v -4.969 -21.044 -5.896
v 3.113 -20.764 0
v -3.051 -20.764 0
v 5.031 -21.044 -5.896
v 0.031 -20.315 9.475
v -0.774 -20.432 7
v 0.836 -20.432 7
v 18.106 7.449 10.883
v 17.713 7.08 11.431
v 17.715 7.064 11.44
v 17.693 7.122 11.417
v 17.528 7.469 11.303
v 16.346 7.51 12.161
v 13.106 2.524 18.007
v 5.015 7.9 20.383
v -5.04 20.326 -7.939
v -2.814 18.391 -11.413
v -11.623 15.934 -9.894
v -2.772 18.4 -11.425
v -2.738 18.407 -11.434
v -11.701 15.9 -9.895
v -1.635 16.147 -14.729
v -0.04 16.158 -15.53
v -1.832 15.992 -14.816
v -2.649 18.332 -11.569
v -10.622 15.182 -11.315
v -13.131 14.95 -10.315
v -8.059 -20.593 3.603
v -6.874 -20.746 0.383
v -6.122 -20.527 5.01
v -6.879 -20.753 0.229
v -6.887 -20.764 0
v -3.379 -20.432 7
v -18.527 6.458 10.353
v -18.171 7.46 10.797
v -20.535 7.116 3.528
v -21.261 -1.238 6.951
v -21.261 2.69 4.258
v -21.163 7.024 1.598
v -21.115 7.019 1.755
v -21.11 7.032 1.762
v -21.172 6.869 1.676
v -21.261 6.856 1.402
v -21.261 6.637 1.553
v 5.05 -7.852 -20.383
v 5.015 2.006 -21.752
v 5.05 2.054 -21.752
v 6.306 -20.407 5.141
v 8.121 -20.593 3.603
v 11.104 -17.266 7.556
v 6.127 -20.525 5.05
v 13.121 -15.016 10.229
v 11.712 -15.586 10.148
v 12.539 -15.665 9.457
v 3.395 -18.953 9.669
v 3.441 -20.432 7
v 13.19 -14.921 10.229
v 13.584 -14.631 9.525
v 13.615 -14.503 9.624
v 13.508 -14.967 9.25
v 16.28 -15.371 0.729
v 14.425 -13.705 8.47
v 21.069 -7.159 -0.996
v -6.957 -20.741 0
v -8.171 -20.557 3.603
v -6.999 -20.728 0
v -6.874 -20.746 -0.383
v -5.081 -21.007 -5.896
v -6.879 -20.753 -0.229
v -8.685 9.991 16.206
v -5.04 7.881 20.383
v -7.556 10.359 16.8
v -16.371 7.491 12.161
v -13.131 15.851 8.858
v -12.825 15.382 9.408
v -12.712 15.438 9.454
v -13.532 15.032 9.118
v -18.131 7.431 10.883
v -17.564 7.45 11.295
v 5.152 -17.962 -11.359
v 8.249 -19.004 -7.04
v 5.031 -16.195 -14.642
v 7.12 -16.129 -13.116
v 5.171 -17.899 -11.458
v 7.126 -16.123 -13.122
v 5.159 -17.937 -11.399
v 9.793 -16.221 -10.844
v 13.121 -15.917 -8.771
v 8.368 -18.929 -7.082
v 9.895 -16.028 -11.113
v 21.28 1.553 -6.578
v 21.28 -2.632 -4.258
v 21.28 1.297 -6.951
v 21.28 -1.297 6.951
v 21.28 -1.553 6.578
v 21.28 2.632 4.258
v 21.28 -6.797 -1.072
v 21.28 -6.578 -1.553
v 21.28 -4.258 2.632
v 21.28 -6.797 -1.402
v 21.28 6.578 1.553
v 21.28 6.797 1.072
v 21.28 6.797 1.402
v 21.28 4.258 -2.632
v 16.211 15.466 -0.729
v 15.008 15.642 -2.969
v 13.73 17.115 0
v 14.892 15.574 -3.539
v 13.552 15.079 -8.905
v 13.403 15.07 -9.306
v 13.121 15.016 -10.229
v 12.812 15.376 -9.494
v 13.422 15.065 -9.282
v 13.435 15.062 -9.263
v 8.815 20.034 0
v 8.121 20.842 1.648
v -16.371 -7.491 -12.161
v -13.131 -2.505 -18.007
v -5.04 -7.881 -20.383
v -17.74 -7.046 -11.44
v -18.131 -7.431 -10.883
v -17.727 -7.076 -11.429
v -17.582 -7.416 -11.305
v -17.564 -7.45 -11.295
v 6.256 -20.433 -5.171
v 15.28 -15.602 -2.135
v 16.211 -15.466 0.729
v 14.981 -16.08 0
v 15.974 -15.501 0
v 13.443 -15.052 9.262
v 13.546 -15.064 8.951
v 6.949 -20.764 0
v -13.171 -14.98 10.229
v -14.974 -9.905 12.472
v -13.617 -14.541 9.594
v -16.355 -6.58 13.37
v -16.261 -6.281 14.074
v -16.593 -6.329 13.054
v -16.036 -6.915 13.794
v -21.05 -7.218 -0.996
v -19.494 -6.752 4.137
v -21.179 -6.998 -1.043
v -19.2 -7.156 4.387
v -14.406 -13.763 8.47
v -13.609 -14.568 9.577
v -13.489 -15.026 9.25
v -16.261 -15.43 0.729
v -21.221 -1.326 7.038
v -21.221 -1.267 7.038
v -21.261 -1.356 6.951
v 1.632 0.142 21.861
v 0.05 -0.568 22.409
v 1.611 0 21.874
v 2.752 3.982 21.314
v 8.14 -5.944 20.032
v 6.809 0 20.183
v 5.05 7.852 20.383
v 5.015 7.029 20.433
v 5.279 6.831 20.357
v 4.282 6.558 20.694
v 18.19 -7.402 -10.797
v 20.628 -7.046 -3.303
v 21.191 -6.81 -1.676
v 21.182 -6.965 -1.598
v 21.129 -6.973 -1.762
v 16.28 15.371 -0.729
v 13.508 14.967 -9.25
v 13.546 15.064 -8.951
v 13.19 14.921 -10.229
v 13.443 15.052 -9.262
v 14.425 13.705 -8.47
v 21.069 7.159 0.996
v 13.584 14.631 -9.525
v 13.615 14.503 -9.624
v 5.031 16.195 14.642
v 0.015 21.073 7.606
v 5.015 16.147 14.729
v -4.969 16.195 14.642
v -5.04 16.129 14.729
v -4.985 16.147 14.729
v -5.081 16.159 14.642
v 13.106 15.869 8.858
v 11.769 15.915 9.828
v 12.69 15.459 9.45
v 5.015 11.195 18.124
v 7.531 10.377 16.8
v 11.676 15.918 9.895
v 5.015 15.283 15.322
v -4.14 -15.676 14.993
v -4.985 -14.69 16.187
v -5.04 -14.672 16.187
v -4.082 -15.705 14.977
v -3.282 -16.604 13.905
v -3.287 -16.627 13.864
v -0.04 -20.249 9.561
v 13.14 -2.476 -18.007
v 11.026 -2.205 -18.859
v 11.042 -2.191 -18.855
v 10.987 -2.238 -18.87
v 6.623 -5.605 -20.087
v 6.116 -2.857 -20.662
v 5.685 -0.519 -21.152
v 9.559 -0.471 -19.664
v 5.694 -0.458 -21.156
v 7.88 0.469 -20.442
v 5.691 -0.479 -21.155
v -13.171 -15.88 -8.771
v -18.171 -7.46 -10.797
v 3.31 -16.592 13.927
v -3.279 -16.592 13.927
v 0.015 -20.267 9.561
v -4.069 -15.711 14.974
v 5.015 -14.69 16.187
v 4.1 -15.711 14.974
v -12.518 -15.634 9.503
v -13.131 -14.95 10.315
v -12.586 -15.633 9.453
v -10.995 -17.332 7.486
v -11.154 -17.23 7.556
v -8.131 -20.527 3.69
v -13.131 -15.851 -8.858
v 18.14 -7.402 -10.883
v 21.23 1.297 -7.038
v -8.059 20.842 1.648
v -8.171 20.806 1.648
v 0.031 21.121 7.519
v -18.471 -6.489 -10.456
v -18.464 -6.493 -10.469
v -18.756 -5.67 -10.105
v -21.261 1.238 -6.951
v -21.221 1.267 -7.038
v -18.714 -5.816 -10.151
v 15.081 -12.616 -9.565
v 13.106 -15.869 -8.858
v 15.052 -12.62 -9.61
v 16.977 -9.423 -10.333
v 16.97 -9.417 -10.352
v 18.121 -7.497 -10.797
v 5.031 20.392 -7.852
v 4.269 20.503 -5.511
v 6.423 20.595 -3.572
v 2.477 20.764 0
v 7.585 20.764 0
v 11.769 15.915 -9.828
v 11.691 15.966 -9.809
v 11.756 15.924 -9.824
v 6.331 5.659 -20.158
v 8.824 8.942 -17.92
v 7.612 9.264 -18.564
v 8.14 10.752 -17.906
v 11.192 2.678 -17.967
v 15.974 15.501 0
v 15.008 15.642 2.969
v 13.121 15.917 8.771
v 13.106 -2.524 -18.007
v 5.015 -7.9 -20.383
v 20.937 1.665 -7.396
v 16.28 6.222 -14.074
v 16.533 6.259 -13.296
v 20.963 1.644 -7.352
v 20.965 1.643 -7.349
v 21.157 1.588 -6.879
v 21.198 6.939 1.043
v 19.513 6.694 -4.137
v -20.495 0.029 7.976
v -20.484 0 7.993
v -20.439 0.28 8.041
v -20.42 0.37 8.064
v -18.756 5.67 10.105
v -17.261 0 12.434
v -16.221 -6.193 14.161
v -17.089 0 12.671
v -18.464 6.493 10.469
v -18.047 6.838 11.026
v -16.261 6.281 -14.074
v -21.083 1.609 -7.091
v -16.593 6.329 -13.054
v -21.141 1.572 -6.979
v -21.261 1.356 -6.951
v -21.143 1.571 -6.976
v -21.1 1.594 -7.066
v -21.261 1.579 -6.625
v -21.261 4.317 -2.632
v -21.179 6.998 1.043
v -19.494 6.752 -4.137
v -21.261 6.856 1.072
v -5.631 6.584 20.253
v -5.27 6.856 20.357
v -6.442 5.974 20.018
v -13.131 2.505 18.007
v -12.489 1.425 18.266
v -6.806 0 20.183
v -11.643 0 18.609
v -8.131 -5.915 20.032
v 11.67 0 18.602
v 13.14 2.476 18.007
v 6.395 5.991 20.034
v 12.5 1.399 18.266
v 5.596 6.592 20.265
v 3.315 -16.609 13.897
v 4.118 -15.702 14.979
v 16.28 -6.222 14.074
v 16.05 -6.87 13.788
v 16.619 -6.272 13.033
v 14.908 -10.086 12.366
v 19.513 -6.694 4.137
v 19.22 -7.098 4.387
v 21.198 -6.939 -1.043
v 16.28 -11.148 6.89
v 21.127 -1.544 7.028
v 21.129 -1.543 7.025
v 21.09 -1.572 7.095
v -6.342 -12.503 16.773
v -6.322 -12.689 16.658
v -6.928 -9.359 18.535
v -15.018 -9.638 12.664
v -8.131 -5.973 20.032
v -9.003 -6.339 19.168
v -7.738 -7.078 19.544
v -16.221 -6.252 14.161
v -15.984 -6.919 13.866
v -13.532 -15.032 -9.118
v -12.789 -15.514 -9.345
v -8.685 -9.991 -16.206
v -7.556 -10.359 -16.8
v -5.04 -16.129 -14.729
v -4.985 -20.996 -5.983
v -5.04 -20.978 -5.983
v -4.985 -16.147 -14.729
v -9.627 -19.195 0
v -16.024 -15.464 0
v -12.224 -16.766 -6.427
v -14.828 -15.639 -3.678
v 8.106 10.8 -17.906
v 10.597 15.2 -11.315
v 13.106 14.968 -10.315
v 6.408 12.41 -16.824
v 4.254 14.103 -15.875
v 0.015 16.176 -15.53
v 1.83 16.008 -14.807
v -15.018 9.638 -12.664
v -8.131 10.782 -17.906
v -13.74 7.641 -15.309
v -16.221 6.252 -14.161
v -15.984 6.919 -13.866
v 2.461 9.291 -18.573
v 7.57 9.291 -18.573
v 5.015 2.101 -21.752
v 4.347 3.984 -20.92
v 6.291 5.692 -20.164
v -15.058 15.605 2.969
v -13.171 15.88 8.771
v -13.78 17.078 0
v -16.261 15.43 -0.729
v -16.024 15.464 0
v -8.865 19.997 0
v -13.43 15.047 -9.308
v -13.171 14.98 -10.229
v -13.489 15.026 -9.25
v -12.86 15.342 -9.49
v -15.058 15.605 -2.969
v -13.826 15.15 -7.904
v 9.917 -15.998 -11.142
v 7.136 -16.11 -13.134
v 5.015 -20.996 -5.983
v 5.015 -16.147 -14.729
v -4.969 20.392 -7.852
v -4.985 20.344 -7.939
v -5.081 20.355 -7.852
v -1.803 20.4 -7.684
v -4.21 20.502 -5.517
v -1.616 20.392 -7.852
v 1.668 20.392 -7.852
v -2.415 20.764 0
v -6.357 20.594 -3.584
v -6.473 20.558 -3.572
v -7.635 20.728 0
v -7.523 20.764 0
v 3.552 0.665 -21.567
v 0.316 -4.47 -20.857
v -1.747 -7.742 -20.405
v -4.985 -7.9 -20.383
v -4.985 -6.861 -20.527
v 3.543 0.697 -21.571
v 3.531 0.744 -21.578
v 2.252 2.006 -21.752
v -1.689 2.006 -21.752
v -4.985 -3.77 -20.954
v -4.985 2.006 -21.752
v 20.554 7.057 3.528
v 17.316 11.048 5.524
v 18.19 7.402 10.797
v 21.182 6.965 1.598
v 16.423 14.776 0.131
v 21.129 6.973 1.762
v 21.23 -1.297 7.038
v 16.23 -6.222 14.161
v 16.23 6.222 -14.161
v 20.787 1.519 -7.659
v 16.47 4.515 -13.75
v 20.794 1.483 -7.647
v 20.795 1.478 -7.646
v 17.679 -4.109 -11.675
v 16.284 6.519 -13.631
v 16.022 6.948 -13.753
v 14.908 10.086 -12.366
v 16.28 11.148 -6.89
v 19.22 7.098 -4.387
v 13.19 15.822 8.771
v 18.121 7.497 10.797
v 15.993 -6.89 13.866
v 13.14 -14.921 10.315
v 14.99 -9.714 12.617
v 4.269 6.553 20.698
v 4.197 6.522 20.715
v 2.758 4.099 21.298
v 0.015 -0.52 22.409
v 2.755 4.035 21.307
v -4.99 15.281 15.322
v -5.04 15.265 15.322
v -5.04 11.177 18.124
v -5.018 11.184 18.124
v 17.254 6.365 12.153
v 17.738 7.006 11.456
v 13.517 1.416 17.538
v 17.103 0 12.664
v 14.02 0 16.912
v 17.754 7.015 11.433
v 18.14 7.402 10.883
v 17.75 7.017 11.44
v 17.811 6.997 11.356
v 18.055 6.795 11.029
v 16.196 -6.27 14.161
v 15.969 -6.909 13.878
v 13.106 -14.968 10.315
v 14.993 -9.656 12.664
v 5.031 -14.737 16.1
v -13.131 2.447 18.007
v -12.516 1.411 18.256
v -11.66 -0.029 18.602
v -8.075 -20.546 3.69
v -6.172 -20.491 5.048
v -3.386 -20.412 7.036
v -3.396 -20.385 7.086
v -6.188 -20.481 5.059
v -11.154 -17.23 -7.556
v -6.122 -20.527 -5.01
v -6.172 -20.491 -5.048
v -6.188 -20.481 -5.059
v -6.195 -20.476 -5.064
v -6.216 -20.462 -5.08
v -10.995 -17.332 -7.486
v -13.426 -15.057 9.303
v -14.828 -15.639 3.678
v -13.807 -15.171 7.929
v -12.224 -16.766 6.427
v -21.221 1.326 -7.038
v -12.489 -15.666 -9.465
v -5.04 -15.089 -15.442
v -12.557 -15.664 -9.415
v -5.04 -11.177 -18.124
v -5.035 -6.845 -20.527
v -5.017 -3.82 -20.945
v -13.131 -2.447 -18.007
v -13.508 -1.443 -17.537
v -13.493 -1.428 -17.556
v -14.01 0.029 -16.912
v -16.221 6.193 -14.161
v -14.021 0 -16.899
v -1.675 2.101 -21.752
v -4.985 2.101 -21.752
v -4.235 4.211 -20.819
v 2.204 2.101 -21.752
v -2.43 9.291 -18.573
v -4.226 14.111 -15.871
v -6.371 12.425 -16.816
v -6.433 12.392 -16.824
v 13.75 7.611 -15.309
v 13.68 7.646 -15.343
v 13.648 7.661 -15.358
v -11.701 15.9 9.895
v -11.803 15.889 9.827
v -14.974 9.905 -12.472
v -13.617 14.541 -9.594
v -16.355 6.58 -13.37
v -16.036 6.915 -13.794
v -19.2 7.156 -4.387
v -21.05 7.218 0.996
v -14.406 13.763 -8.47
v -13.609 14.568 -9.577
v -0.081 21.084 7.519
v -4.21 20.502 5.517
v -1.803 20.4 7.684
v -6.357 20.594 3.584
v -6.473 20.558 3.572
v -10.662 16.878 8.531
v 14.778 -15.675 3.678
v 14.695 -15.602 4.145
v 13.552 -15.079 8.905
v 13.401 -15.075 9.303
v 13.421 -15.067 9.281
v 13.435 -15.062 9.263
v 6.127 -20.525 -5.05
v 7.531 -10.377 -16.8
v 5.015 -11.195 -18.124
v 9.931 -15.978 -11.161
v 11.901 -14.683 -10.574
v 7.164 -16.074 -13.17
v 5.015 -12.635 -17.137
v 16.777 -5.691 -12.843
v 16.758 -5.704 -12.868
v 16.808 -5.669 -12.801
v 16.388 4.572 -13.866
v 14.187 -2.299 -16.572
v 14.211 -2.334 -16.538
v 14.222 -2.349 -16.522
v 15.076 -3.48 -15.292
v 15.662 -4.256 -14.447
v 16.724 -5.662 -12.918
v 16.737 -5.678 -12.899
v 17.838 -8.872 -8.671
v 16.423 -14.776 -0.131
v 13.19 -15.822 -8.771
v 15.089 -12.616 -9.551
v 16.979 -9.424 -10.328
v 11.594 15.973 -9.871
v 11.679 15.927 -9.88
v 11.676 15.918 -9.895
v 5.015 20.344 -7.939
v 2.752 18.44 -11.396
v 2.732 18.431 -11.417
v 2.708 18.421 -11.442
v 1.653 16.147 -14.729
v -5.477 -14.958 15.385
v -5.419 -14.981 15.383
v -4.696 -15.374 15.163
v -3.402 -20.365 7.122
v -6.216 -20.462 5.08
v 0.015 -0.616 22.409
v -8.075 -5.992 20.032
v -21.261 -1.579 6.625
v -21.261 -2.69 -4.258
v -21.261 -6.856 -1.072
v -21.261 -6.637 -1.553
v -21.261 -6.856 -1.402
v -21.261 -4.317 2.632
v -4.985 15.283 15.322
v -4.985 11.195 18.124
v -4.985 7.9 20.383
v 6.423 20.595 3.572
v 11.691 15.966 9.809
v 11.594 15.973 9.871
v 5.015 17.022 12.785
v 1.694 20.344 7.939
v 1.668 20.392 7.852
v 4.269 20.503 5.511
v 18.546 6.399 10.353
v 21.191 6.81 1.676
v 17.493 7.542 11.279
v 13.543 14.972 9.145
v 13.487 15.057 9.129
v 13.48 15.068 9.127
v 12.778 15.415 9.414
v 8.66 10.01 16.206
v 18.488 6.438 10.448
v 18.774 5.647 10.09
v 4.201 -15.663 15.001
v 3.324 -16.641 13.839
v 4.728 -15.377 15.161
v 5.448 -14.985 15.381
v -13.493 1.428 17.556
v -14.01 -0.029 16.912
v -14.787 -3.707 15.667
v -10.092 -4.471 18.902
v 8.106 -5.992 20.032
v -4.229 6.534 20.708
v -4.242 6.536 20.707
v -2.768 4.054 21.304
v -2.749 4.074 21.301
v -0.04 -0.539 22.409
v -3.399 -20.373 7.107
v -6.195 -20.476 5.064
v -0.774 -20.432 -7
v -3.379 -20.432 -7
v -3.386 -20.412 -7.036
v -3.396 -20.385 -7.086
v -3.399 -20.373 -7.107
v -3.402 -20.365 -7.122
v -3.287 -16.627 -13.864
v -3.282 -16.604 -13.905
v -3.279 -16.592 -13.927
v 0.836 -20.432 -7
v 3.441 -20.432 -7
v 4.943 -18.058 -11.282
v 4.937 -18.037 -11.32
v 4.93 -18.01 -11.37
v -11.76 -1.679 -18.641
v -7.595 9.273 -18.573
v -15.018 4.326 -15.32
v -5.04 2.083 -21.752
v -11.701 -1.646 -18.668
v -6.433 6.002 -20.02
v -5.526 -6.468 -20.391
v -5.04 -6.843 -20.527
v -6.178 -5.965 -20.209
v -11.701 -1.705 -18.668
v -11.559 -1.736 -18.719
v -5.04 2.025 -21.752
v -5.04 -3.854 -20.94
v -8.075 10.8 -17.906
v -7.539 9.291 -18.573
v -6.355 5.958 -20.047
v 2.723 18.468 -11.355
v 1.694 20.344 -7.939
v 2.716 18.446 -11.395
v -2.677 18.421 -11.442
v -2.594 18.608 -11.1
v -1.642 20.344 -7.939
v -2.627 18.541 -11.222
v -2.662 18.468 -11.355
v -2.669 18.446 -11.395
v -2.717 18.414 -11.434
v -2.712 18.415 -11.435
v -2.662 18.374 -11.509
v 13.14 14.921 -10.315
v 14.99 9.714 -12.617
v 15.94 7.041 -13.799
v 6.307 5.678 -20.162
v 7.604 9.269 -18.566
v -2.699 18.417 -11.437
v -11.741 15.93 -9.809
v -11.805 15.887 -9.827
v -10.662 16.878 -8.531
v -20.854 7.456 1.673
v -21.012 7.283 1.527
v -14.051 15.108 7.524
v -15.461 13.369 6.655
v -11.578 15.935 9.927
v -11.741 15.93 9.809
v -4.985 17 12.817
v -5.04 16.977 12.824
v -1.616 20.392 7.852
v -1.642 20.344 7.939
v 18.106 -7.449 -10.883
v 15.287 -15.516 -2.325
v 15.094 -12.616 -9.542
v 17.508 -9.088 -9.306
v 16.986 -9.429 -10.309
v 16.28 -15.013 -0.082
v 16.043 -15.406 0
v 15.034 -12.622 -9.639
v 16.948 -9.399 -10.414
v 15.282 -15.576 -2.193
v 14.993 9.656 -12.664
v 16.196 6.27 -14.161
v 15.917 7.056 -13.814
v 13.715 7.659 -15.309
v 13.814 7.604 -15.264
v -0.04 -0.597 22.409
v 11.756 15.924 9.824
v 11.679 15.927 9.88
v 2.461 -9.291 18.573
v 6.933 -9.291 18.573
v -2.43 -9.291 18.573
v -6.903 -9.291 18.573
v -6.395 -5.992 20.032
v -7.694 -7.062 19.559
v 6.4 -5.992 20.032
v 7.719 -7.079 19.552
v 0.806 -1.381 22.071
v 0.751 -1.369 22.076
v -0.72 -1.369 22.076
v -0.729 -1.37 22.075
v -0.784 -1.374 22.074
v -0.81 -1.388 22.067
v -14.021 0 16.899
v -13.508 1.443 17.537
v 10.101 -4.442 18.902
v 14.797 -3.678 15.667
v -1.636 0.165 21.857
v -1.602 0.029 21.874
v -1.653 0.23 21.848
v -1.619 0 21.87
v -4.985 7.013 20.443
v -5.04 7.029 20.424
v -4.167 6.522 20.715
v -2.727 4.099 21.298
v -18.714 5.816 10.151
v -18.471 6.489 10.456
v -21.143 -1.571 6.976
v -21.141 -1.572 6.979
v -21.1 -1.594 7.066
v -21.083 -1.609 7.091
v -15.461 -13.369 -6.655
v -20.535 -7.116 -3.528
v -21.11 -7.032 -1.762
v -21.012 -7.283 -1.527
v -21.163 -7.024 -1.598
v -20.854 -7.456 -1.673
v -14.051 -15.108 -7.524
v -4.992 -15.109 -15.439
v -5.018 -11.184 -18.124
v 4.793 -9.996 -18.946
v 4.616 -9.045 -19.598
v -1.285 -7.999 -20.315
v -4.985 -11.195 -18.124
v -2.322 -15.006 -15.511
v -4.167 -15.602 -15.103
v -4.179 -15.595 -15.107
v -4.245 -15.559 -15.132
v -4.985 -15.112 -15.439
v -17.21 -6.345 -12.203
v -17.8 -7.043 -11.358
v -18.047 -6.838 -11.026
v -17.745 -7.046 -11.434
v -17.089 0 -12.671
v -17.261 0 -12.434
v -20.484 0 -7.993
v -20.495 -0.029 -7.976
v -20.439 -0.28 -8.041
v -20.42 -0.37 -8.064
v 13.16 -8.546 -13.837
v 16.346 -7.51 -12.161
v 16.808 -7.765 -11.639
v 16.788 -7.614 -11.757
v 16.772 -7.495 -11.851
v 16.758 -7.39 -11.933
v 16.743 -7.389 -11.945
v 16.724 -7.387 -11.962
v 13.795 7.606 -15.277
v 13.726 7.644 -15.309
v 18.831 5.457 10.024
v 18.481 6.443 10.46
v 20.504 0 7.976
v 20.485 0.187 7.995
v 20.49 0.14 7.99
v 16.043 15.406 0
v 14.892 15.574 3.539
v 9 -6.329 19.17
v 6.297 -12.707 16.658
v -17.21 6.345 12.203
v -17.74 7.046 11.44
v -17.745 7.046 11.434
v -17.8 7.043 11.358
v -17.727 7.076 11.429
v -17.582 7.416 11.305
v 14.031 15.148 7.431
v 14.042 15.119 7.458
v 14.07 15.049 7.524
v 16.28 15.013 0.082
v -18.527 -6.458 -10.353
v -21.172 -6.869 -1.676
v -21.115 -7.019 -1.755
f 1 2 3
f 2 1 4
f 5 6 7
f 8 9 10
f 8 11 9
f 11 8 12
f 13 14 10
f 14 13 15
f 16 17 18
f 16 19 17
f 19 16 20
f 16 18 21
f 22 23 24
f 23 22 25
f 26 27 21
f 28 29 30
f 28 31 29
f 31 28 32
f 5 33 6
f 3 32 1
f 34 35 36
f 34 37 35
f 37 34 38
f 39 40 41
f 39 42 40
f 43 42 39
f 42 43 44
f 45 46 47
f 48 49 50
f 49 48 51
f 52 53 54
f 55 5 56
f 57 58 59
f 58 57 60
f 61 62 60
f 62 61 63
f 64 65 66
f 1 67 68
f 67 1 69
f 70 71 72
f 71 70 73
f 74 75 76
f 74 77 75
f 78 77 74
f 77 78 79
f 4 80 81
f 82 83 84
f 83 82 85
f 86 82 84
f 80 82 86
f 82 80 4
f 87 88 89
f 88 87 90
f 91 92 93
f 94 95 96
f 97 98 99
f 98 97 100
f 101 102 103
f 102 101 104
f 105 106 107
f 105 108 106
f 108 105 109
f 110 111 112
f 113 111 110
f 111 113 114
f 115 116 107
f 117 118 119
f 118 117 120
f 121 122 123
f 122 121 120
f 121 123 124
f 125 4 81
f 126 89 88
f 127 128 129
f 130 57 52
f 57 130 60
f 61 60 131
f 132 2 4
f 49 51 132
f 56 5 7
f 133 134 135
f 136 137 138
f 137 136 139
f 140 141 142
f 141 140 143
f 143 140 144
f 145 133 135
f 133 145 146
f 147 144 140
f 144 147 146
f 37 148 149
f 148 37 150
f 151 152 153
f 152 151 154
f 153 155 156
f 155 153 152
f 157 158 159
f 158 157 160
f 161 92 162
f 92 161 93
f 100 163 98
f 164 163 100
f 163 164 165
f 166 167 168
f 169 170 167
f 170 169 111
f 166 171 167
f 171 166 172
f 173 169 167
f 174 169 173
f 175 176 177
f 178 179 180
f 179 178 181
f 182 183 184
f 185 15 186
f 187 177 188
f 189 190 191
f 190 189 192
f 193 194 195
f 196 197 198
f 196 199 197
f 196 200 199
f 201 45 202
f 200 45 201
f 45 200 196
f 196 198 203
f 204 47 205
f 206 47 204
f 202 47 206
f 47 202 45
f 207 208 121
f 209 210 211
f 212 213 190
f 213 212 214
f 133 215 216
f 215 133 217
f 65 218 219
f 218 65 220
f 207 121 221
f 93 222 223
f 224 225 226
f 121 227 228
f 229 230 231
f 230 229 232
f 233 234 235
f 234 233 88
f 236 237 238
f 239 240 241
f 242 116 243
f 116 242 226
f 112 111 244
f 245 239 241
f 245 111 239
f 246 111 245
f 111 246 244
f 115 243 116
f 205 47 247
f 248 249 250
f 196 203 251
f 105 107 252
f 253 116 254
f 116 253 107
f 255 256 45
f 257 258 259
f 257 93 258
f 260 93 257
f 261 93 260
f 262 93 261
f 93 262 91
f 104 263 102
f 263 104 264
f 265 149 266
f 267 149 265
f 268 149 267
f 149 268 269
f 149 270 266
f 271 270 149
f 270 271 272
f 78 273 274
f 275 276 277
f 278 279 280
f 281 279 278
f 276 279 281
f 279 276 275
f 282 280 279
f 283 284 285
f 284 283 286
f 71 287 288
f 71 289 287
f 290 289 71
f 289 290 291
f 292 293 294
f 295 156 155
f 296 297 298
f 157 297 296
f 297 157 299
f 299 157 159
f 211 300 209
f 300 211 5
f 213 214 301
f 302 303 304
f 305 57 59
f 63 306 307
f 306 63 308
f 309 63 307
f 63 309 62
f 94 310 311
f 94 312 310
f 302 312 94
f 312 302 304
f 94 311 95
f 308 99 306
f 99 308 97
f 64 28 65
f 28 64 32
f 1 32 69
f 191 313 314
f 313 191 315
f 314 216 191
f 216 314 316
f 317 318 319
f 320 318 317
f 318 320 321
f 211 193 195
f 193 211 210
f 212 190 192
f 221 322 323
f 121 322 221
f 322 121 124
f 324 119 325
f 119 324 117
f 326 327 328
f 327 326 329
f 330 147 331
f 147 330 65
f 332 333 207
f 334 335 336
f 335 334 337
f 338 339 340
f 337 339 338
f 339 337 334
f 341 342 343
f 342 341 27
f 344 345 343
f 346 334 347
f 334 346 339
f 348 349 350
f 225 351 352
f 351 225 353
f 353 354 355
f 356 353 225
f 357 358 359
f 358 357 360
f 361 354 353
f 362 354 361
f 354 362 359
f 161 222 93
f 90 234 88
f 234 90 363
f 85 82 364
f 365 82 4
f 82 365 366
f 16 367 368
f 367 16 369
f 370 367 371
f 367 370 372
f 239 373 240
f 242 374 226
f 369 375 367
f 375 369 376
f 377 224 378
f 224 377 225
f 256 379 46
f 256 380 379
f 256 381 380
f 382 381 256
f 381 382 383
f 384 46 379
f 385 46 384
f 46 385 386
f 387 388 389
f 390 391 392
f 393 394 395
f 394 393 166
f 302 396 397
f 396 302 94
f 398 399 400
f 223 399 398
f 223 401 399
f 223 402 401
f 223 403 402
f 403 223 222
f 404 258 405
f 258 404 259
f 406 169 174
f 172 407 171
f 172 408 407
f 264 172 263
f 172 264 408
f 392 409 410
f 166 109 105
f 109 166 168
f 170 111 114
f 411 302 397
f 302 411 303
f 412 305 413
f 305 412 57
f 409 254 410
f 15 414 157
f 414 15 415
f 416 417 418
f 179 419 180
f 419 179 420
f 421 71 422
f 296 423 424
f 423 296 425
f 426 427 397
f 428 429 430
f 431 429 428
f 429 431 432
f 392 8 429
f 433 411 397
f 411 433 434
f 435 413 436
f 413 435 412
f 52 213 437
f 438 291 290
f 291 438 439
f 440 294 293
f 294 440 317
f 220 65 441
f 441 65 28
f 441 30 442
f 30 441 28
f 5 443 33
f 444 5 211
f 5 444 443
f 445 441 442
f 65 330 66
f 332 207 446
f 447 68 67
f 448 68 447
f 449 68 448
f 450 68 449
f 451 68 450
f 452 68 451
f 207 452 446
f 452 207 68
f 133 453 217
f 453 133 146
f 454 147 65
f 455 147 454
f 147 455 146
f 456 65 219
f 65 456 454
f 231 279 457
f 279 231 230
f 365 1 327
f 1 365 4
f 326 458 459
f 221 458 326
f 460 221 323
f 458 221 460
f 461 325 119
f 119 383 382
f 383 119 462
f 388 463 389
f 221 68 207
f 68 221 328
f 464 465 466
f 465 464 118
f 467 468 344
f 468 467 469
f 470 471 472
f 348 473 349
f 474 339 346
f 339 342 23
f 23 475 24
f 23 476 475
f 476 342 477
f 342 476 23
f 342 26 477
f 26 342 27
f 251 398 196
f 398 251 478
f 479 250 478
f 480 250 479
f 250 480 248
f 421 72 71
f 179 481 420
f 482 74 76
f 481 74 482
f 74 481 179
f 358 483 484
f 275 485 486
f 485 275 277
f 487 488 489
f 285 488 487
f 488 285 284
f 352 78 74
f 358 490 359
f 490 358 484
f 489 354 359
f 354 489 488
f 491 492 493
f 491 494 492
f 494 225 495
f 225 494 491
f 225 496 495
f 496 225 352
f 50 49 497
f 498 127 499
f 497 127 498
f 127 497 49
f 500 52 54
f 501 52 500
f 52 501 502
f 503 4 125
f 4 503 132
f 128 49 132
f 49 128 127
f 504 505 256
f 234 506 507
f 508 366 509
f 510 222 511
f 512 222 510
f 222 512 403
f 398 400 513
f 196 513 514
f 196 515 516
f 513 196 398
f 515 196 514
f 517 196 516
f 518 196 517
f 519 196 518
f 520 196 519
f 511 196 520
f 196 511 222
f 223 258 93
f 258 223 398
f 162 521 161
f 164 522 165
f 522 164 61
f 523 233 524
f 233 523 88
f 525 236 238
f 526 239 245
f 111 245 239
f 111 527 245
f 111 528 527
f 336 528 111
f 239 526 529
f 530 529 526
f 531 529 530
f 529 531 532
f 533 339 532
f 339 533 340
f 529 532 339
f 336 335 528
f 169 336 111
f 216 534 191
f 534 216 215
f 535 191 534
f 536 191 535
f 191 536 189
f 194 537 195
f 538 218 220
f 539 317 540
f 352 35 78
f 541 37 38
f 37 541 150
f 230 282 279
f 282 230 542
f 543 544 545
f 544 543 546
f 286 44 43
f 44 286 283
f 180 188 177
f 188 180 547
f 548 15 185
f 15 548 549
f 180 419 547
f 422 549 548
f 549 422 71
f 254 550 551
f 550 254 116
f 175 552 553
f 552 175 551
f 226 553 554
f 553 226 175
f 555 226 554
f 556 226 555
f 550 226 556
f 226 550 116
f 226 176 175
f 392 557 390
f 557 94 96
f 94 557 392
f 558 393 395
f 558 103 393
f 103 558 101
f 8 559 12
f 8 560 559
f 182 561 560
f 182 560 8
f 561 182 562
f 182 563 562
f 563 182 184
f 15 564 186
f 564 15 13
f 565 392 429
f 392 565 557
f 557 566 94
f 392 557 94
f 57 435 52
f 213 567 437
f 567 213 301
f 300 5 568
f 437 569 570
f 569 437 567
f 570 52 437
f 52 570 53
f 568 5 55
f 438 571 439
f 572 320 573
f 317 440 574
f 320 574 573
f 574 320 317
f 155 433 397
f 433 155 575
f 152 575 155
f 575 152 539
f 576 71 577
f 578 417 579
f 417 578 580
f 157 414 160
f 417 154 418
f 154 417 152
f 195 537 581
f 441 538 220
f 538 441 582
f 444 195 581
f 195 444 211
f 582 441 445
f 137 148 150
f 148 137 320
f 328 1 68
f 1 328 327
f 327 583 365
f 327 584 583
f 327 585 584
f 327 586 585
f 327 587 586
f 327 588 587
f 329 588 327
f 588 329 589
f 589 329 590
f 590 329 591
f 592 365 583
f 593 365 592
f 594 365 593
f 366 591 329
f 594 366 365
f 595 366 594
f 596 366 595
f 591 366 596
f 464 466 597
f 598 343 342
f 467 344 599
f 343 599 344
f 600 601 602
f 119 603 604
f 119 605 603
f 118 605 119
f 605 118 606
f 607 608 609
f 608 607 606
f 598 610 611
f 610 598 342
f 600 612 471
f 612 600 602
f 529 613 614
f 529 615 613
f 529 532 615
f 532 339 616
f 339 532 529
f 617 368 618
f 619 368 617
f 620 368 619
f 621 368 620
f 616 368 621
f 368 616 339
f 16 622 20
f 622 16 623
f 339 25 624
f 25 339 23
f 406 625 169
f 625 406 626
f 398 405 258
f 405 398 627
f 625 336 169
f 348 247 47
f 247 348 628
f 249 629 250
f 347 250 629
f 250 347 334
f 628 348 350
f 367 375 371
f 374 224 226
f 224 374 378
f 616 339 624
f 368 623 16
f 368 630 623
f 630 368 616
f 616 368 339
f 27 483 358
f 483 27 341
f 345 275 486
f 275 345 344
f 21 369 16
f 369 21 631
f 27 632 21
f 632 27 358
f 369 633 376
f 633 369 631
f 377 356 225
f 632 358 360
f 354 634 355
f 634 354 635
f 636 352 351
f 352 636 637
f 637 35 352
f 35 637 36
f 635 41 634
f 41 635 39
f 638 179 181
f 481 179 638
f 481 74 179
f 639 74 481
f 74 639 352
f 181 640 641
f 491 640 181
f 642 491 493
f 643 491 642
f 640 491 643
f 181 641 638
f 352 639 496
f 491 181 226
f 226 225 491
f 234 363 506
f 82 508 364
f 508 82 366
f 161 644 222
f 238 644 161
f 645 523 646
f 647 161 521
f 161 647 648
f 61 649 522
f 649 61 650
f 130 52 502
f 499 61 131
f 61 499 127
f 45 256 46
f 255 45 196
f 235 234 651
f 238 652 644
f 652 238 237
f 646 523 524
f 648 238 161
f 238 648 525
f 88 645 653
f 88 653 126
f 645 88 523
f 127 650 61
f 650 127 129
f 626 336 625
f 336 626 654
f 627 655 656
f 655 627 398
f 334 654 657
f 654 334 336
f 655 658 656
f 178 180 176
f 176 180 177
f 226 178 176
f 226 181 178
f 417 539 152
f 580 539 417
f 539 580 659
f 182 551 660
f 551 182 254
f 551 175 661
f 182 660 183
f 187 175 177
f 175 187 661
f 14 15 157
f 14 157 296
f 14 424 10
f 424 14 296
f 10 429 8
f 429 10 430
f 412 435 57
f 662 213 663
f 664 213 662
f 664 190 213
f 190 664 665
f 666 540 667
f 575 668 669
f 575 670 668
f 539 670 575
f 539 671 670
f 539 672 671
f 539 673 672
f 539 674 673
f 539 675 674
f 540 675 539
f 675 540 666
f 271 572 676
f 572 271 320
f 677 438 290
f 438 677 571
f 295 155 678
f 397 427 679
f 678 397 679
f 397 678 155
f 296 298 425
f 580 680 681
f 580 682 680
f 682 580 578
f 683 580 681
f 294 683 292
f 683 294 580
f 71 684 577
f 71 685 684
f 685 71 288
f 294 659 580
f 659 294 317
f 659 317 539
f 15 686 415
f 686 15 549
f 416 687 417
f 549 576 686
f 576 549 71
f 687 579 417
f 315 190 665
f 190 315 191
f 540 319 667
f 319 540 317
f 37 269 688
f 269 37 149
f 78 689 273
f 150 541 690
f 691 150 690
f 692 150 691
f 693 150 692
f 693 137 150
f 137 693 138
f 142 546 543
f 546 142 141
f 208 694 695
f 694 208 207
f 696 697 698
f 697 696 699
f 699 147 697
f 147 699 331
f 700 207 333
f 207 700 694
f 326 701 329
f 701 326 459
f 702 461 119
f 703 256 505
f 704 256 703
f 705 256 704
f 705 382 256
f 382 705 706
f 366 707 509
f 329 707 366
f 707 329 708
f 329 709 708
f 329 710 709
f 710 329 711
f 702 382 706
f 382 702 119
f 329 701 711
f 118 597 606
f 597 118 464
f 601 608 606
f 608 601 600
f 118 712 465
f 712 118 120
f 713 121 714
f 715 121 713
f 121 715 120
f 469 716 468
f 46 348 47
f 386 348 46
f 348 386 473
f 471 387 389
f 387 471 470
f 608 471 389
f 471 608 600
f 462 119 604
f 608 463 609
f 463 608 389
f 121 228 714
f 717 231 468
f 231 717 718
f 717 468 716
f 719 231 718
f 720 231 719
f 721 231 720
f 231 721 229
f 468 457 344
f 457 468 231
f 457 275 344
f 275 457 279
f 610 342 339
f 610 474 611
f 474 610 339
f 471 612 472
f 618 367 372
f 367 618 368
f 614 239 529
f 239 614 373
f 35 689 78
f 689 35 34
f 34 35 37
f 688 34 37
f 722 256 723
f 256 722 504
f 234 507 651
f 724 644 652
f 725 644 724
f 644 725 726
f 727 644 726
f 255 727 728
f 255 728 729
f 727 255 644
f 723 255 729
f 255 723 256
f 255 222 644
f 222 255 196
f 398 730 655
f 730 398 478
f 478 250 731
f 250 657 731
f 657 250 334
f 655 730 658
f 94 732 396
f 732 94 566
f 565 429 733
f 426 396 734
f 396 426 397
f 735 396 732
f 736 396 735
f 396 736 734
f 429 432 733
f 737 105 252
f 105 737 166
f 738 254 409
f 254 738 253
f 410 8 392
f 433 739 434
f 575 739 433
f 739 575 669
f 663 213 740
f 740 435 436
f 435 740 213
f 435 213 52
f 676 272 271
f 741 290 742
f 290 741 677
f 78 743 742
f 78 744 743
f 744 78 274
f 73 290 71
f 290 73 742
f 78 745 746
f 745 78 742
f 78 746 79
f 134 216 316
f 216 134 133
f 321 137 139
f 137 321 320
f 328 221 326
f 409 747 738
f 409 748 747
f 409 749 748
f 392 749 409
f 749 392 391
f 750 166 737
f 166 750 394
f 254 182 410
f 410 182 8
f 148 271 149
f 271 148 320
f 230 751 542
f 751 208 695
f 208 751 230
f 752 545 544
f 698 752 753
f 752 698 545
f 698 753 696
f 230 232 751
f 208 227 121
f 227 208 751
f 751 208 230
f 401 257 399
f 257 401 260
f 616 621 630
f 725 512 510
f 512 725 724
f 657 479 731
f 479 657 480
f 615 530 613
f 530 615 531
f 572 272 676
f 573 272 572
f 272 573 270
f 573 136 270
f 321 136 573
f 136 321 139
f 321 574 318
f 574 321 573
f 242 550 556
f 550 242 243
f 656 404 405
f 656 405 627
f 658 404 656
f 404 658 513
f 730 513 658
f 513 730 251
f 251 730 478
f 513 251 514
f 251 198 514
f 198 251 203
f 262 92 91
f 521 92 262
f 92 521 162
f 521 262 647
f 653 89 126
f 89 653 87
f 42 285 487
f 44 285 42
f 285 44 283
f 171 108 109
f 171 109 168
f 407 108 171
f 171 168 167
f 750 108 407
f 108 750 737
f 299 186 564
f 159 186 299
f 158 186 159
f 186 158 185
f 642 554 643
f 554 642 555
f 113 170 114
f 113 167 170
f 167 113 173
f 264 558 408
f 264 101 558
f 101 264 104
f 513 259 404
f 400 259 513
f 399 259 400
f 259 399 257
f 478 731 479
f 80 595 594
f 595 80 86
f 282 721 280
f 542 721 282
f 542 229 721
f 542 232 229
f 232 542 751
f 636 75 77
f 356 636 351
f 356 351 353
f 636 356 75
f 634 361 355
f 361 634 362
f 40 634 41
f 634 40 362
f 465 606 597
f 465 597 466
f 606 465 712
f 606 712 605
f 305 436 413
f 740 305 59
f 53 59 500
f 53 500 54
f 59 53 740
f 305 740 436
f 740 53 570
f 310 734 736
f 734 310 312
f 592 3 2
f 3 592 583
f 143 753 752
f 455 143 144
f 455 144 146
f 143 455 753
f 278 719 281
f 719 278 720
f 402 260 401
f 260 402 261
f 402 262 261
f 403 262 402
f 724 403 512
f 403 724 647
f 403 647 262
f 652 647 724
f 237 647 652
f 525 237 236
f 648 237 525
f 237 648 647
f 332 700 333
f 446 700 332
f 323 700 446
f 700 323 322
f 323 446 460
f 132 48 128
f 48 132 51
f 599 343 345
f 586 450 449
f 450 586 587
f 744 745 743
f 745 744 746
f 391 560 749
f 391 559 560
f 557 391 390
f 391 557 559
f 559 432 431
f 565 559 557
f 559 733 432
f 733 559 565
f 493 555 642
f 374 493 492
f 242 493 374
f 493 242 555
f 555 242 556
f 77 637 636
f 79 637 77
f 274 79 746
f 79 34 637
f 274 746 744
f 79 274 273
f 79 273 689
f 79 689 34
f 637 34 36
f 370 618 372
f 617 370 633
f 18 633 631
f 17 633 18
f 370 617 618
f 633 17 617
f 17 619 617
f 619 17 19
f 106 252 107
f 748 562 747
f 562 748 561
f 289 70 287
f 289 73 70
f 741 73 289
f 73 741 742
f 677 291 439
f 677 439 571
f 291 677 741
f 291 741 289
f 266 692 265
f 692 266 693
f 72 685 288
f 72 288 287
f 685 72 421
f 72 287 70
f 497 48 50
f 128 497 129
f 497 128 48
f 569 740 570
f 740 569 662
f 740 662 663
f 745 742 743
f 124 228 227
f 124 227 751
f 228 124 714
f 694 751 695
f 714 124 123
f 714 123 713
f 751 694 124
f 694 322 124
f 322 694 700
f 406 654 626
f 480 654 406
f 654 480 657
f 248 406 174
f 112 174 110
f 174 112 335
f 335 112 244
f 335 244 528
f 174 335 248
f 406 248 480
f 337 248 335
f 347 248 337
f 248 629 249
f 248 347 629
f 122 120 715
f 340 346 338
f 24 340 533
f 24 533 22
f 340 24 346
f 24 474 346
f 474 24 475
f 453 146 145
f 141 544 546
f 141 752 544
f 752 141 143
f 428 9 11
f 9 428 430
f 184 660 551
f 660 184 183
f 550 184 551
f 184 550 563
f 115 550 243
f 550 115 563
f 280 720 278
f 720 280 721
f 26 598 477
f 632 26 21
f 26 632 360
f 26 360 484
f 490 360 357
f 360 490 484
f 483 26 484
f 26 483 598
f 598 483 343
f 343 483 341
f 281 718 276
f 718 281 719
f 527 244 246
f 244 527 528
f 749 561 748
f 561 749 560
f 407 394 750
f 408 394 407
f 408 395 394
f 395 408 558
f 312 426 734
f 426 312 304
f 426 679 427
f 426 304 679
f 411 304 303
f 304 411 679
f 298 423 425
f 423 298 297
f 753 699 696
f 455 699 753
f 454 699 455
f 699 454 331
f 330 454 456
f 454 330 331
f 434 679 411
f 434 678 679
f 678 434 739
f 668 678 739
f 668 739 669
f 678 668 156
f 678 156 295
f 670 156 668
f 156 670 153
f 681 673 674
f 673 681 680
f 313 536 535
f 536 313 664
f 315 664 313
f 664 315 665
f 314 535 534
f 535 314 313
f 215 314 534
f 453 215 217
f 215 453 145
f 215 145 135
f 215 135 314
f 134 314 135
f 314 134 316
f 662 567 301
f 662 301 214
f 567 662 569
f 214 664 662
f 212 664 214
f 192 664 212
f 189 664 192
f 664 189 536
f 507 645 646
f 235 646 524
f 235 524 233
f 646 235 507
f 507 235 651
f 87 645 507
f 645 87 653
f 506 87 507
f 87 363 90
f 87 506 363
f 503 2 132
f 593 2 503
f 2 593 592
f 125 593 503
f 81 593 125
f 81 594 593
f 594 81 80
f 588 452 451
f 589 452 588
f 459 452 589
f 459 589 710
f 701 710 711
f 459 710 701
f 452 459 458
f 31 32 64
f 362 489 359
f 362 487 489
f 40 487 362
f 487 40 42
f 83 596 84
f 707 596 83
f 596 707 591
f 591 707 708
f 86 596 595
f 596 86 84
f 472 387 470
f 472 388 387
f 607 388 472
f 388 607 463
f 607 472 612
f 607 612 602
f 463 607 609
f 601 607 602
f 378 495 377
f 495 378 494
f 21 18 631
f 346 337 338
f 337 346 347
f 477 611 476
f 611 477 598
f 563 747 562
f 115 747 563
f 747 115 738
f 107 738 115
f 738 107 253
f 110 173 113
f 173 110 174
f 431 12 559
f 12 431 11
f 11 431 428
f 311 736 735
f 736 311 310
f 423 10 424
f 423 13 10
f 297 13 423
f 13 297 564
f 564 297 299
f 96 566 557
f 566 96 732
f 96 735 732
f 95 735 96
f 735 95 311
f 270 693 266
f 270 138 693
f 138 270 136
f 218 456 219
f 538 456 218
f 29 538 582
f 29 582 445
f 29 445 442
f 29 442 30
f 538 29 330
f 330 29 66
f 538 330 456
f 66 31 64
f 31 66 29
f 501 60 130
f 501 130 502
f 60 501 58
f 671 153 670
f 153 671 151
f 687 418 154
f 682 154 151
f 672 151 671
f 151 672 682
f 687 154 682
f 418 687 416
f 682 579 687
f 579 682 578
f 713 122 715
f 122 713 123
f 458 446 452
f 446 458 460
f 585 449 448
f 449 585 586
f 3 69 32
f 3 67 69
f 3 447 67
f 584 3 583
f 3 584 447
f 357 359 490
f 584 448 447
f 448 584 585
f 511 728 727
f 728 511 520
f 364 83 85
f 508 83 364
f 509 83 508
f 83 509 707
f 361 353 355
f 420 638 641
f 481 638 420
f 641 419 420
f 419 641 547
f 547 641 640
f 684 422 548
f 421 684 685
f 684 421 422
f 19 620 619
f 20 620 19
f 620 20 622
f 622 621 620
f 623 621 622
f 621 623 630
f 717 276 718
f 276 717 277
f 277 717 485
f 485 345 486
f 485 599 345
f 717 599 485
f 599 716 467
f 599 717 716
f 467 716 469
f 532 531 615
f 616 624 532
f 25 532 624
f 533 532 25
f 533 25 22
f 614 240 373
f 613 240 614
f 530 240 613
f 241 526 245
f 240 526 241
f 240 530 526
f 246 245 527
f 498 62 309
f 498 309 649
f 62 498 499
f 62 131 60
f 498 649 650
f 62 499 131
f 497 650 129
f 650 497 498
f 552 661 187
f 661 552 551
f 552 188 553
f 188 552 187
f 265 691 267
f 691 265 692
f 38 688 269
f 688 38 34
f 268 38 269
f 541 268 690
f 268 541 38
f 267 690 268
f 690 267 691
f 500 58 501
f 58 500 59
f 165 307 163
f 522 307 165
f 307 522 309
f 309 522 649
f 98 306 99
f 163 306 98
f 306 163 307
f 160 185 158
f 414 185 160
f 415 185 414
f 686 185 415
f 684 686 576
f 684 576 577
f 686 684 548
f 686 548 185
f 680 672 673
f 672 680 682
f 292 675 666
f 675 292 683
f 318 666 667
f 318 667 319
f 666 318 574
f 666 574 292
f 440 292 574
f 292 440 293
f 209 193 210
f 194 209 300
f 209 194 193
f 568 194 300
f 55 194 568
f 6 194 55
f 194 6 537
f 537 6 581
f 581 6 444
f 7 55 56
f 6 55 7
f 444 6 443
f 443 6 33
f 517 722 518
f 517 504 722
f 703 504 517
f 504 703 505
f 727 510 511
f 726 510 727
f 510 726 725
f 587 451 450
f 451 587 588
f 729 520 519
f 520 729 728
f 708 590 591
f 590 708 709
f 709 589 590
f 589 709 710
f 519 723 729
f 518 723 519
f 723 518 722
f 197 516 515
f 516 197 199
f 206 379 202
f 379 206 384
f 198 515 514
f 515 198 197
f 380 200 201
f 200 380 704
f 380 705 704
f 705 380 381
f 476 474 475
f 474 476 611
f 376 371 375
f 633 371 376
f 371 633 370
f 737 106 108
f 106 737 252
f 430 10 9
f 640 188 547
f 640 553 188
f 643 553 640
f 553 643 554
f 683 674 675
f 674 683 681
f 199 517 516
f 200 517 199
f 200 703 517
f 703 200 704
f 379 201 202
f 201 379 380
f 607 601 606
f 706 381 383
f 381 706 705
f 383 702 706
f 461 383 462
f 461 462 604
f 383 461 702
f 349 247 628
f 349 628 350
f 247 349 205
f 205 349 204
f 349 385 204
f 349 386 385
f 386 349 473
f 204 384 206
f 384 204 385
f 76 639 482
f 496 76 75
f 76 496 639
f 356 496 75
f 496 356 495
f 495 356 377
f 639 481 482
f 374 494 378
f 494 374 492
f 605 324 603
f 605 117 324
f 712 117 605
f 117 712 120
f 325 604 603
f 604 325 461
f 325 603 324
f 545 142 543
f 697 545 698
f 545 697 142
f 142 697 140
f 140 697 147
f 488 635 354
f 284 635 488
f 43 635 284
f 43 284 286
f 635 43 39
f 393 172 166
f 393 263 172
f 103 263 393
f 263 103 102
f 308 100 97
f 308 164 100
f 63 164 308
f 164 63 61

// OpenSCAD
// Auto-generated OpenSCAD file

    inner_points = 10*[[0.5000000000001233, 1.6099947582269307, -1.4642352461204697], [-1.6180339887500594, -0.7526043623065494, 1.3422446358941107], [0.8090169943752056, 0.7804419520270026, -1.929370322107236], [-1.3090169943749772, -1.5821571685064775, 0.8771095599073444], [1.3090169943749772, 1.5821571685064775, -0.8771095599073444], [-0.8090169943752056, -0.7804419520270026, 1.929370322107236], [1.6180339887500594, 0.7526043623065494, -1.3422446358941107], [-0.5000000000001233, -1.6099947582269307, 1.4642352461204697], [-1.6180339887497301, 0.752604362306319, -1.342244635894637], [-2.118033988749798, 0.1948703662791984, -0.6797246062536065], [-1.309016994374648, -0.07694844389360919, -1.8073797118814032], [-1.8090169943747159, -0.6346824399207297, -1.144859682240373], [1.8090169943747159, 0.6346824399207297, 1.144859682240373], [1.309016994374648, 0.07694844389360919, 1.8073797118814032], [2.118033988749798, -0.1948703662791984, 0.6797246062536065], [1.6180339887497301, -0.752604362306319, 1.342244635894637], [-2.7630675525358583e-14, 2.1025431187665826, -0.7519178221235898], [-1.30901699437522, 1.4920728358409685, 1.0228690720136886], [0.8618033988753376, -0.21095885990434457, -2.0491118170111076], [2.9809488211185453e-13, -2.021969242147636, -0.9474747285857835], [0.8090169943748263, 2.0747055290461294, -0.1647921359104645], [-0.500000000000366, 1.4642352461205153, 1.609994758226814], [1.6708203932501915, -0.2387964496247978, -1.4619861307979825], [0.8090169943751521, -2.0498068318680893, -0.3603490423726582], [-0.5000000000002721, 2.0296633627133747, 0.7851971800500518], [-1.309016994375247, 0.07694844389342262, 1.8073797118809776], [0.8618033988753109, -1.6260832518518904, -1.264601177143819], [-0.49999999999994665, -2.094848998200844, 0.5896402735878584], [-0.8090169943746892, 0.7804419520268874, -1.9293703221074994], [-2.118033988749815, -0.6797246062534129, -0.19487036627969367], [2.118033988749815, 0.6797246062534129, 0.19487036627969367], [0.8090169943746892, -0.7804419520268874, 1.9293703221074994], [-1.6180339887500161, 1.5371150021736077, 0.07287975605290908], [-0.49999999999963374, -1.4642352461205865, -1.6099947582269767], [0.49999999999963374, 1.4642352461205865, 1.6099947582269767], [1.6180339887500161, -1.5371150021736077, -0.07287975605290908], [-0.49999999999987643, 1.6099947582268597, -1.4642352461206323], [-2.1180339887499917, -0.19487036627950022, 0.6797246062529179], [3.4166940110491595e-13, 0.26775012233252143, -2.2168396084269855], [-1.6180339887497732, -1.5371150021738385, -0.07287975605343533], [1.6180339887497732, 1.5371150021738385, 0.07287975605343533], [-3.4166940110491595e-13, -0.26775012233252143, 2.2168396084269855], [2.1180339887499917, 0.19487036627950022, -0.6797246062529179], [0.49999999999987643, -1.6099947582268597, 1.4642352461206323], [-1.3090169943749175, 1.5821571685062912, -0.8771095599077703], [-2.118033988749975, 0.6797246062531112, 0.1948703662790049], [-0.4999999999996173, -0.5896402735879751, -2.0948489982008898], [-1.3090169943746748, -1.4920728358411552, -1.0228690720141145], [1.3090169943746748, 1.4920728358411552, 1.0228690720141145], [0.4999999999996173, 0.5896402735879751, 2.0948489982008898], [2.118033988749975, -0.6797246062531112, -0.1948703662790049], [1.3090169943749175, -1.5821571685062912, 0.8771095599077703], [-0.8090169943750684, 2.074705529046014, -0.1647921359107279], [-1.8090169943751788, 0.634682439920472, 1.1448596822397847], [0.36180339887537877, -1.068349255824841, -1.9271212067850119], [-0.8090169943747427, -2.0498068318682043, -0.3603490423729214], [0.4999999999997277, 2.029663362713446, 0.7851971800502144], [-0.5000000000003827, 0.5896402735879039, 2.0948489982007272], [1.6708203932501748, -1.1133914221574093, -0.9771318908240696], [0.5000000000000535, -2.0948489982007725, 0.589640273588021]];

    outer_points = 10*[[-0.5000000000005009, -0.7851971800501374, -2.0296633627132854], [-0.4999999999996386, 1.6099947582268983, 1.4642352461206711], [-0.5000000000003614, -1.6099947582268983, -1.4642352461204242], [-0.4999999999994991, 0.7851971800501374, 2.0296633627135323], [0.4999999999994991, -0.7851971800501374, -2.0296633627135323], [0.5000000000003614, 1.6099947582268983, 1.4642352461204242], [0.4999999999996386, -1.6099947582268983, -1.4642352461206711], [0.5000000000005009, 0.7851971800501374, 2.0296633627132854], [-2.1180339887500663, 0.12968473079194998, -0.6951128473842882], [-2.118033988749863, 0.6951128473848109, 0.1296847307924727], [-2.118033988749927, -0.6951128473848109, -0.12968473079142726], [-2.1180339887497235, -0.12968473079194998, 0.6951128473853336], [2.1180339887497235, 0.12968473079194998, -0.6951128473853336], [2.118033988749927, 0.6951128473848109, 0.12968473079142726], [2.118033988749863, -0.6951128473848109, -0.1296847307924727], [2.1180339887500663, -0.12968473079194998, 0.6951128473842882], [-0.5000000000005347, 0.2053913419602993, -2.166536954253724], [-0.5000000000001937, 2.029663362713409, -0.785197180050014], [-0.5000000000001456, -2.0948489982008094, -0.5896402735878118], [-0.49999999999960265, -1.4642352461205477, 1.6099947582270218], [0.4999999999994653, 0.2053913419602993, -2.1665369542539707], [0.4999999999998062, 2.029663362713409, -0.7851971800502607], [0.4999999999998545, -2.0948489982008094, -0.5896402735880585], [0.5000000000003973, -1.4642352461205477, 1.6099947582267748], [-3.811205046546957e-13, 1.612821613342072, -1.5443038629222117], [1.8556665349805936e-13, 2.102543118766584, 0.7519178221235856], [2.338283645958706e-13, -2.021969242147634, 0.9474747285857879], [5.50894046796066e-13, -0.05680497473877466, 2.2322278495585337], [-1.809016994375214, -0.7401550137174742, -1.0796740467522328], [-1.809016994374681, 0.7401550137174742, 1.0796740467531258], [1.809016994374681, -0.7401550137174742, -1.0796740467531258], [1.809016994375214, 0.7401550137174742, 1.0796740467522328], [-1.3090169943752, 1.4920728358410598, -1.0228690720135816], [-1.309016994374695, -1.4920728358410598, 1.0228690720142277], [1.309016994374695, 1.4920728358410598, -1.0228690720142277], [1.3090169943752, -1.4920728358410598, 1.0228690720135816], [-1.3090169943753898, -0.24760665317778863, -1.7919914707493183], [-1.309016994374731, 1.5821571685063862, 0.8771095599078771], [-1.309016994375164, -1.5821571685063862, -0.8771095599072309], [-1.3090169943745051, 0.24760665317778863, 1.7919914707499645], [1.3090169943745051, -0.24760665317778863, -1.7919914707499645], [1.309016994375164, 1.5821571685063862, 0.8771095599072309], [1.309016994374731, -1.5821571685063862, -0.8771095599078771], [1.3090169943753898, 0.24760665317778863, 1.7919914707493183], [-1.6180339887502422, 0.6222330913316356, -1.4074302713813738], [-1.6180339887499129, 1.537115002173723, -0.072879756052776], [-1.618033988749877, -1.537115002173723, 0.07287975605357463], [-1.6180339887495476, -0.6222330913316356, 1.4074302713821722], [1.6180339887495476, 0.6222330913316356, -1.4074302713821722], [1.618033988749877, 1.537115002173723, -0.07287975605357463], [1.6180339887499129, -1.537115002173723, 0.072879756052776], [1.6180339887502422, -0.6222330913316356, 1.4074302713813738], [-0.8090169943753872, 1.0752310864697234, -1.7819757548857793], [-0.8090169943749068, 2.0747055290460716, 0.16479213591079148], [-0.8090169943748585, -2.049806831868146, 0.36034904237299387], [-0.8090169943744552, -0.5943955016111235, 1.9945559575949663], [0.8090169943745077, 1.0752310864697234, -1.7819757548861785], [0.8090169943749881, 2.0747055290460716, 0.16479213591039218], [0.8090169943750364, -2.049806831868146, 0.3603490423725945], [0.8090169943754397, -0.5943955016111235, 1.994555957594567]];

    // Convex hull for inner set (I)
    module inner_hull() {
        hull() {
            for (p = inner_points) {
                translate(p) sphere(r=0.1);
            }
        }
    }

    // Convex hull for outer set (O) minus inner hull (O \ I)
    module outer_minus_inner() {
        difference() {
            hull() {
                for (p = outer_points) {
                    translate(p) sphere(r=0.1);
                }
            }
            inner_hull(); // Subtract inner hull
        }
    }

    // Convex hull for outer set (O) minus all translated inner hulls
    module outer_minus_AllTranslationInner() {
        difference() {
            hull() {
                for (p = outer_points) {
                    translate(p) sphere(r=0.1);
                }
            }
            hull() {
                translate([0,0,50]) inner_hull();
                translate([0,0,-50]) inner_hull();
            }; // Subtract translated inner hulls
        }
    }

    // Difference between outer_minus_inner and outer_minus_AllTranslationInner
    module outer_minus_inner_diff() {
        difference() {
            // Outer minus inner
            difference() {
                hull() {
                    for (p = outer_points) {
                        translate(p) sphere(r=0.1);
                    }
                }
                inner_hull();
            }

            // Subtract Outer minus AllTranslationInner
            difference() {
                hull() {
                    for (p = outer_points) {
                        translate(p) sphere(r=0.1);
                    }
                }
                hull() {
                    translate([0,0,50]) inner_hull();
                    translate([0,0,-50]) inner_hull();
                };
            }
        }
    }

    // Rendering all with colors applied
    color([1, 1, 0, 1]) outer_minus_inner_diff(); // Opaque yellow
    
